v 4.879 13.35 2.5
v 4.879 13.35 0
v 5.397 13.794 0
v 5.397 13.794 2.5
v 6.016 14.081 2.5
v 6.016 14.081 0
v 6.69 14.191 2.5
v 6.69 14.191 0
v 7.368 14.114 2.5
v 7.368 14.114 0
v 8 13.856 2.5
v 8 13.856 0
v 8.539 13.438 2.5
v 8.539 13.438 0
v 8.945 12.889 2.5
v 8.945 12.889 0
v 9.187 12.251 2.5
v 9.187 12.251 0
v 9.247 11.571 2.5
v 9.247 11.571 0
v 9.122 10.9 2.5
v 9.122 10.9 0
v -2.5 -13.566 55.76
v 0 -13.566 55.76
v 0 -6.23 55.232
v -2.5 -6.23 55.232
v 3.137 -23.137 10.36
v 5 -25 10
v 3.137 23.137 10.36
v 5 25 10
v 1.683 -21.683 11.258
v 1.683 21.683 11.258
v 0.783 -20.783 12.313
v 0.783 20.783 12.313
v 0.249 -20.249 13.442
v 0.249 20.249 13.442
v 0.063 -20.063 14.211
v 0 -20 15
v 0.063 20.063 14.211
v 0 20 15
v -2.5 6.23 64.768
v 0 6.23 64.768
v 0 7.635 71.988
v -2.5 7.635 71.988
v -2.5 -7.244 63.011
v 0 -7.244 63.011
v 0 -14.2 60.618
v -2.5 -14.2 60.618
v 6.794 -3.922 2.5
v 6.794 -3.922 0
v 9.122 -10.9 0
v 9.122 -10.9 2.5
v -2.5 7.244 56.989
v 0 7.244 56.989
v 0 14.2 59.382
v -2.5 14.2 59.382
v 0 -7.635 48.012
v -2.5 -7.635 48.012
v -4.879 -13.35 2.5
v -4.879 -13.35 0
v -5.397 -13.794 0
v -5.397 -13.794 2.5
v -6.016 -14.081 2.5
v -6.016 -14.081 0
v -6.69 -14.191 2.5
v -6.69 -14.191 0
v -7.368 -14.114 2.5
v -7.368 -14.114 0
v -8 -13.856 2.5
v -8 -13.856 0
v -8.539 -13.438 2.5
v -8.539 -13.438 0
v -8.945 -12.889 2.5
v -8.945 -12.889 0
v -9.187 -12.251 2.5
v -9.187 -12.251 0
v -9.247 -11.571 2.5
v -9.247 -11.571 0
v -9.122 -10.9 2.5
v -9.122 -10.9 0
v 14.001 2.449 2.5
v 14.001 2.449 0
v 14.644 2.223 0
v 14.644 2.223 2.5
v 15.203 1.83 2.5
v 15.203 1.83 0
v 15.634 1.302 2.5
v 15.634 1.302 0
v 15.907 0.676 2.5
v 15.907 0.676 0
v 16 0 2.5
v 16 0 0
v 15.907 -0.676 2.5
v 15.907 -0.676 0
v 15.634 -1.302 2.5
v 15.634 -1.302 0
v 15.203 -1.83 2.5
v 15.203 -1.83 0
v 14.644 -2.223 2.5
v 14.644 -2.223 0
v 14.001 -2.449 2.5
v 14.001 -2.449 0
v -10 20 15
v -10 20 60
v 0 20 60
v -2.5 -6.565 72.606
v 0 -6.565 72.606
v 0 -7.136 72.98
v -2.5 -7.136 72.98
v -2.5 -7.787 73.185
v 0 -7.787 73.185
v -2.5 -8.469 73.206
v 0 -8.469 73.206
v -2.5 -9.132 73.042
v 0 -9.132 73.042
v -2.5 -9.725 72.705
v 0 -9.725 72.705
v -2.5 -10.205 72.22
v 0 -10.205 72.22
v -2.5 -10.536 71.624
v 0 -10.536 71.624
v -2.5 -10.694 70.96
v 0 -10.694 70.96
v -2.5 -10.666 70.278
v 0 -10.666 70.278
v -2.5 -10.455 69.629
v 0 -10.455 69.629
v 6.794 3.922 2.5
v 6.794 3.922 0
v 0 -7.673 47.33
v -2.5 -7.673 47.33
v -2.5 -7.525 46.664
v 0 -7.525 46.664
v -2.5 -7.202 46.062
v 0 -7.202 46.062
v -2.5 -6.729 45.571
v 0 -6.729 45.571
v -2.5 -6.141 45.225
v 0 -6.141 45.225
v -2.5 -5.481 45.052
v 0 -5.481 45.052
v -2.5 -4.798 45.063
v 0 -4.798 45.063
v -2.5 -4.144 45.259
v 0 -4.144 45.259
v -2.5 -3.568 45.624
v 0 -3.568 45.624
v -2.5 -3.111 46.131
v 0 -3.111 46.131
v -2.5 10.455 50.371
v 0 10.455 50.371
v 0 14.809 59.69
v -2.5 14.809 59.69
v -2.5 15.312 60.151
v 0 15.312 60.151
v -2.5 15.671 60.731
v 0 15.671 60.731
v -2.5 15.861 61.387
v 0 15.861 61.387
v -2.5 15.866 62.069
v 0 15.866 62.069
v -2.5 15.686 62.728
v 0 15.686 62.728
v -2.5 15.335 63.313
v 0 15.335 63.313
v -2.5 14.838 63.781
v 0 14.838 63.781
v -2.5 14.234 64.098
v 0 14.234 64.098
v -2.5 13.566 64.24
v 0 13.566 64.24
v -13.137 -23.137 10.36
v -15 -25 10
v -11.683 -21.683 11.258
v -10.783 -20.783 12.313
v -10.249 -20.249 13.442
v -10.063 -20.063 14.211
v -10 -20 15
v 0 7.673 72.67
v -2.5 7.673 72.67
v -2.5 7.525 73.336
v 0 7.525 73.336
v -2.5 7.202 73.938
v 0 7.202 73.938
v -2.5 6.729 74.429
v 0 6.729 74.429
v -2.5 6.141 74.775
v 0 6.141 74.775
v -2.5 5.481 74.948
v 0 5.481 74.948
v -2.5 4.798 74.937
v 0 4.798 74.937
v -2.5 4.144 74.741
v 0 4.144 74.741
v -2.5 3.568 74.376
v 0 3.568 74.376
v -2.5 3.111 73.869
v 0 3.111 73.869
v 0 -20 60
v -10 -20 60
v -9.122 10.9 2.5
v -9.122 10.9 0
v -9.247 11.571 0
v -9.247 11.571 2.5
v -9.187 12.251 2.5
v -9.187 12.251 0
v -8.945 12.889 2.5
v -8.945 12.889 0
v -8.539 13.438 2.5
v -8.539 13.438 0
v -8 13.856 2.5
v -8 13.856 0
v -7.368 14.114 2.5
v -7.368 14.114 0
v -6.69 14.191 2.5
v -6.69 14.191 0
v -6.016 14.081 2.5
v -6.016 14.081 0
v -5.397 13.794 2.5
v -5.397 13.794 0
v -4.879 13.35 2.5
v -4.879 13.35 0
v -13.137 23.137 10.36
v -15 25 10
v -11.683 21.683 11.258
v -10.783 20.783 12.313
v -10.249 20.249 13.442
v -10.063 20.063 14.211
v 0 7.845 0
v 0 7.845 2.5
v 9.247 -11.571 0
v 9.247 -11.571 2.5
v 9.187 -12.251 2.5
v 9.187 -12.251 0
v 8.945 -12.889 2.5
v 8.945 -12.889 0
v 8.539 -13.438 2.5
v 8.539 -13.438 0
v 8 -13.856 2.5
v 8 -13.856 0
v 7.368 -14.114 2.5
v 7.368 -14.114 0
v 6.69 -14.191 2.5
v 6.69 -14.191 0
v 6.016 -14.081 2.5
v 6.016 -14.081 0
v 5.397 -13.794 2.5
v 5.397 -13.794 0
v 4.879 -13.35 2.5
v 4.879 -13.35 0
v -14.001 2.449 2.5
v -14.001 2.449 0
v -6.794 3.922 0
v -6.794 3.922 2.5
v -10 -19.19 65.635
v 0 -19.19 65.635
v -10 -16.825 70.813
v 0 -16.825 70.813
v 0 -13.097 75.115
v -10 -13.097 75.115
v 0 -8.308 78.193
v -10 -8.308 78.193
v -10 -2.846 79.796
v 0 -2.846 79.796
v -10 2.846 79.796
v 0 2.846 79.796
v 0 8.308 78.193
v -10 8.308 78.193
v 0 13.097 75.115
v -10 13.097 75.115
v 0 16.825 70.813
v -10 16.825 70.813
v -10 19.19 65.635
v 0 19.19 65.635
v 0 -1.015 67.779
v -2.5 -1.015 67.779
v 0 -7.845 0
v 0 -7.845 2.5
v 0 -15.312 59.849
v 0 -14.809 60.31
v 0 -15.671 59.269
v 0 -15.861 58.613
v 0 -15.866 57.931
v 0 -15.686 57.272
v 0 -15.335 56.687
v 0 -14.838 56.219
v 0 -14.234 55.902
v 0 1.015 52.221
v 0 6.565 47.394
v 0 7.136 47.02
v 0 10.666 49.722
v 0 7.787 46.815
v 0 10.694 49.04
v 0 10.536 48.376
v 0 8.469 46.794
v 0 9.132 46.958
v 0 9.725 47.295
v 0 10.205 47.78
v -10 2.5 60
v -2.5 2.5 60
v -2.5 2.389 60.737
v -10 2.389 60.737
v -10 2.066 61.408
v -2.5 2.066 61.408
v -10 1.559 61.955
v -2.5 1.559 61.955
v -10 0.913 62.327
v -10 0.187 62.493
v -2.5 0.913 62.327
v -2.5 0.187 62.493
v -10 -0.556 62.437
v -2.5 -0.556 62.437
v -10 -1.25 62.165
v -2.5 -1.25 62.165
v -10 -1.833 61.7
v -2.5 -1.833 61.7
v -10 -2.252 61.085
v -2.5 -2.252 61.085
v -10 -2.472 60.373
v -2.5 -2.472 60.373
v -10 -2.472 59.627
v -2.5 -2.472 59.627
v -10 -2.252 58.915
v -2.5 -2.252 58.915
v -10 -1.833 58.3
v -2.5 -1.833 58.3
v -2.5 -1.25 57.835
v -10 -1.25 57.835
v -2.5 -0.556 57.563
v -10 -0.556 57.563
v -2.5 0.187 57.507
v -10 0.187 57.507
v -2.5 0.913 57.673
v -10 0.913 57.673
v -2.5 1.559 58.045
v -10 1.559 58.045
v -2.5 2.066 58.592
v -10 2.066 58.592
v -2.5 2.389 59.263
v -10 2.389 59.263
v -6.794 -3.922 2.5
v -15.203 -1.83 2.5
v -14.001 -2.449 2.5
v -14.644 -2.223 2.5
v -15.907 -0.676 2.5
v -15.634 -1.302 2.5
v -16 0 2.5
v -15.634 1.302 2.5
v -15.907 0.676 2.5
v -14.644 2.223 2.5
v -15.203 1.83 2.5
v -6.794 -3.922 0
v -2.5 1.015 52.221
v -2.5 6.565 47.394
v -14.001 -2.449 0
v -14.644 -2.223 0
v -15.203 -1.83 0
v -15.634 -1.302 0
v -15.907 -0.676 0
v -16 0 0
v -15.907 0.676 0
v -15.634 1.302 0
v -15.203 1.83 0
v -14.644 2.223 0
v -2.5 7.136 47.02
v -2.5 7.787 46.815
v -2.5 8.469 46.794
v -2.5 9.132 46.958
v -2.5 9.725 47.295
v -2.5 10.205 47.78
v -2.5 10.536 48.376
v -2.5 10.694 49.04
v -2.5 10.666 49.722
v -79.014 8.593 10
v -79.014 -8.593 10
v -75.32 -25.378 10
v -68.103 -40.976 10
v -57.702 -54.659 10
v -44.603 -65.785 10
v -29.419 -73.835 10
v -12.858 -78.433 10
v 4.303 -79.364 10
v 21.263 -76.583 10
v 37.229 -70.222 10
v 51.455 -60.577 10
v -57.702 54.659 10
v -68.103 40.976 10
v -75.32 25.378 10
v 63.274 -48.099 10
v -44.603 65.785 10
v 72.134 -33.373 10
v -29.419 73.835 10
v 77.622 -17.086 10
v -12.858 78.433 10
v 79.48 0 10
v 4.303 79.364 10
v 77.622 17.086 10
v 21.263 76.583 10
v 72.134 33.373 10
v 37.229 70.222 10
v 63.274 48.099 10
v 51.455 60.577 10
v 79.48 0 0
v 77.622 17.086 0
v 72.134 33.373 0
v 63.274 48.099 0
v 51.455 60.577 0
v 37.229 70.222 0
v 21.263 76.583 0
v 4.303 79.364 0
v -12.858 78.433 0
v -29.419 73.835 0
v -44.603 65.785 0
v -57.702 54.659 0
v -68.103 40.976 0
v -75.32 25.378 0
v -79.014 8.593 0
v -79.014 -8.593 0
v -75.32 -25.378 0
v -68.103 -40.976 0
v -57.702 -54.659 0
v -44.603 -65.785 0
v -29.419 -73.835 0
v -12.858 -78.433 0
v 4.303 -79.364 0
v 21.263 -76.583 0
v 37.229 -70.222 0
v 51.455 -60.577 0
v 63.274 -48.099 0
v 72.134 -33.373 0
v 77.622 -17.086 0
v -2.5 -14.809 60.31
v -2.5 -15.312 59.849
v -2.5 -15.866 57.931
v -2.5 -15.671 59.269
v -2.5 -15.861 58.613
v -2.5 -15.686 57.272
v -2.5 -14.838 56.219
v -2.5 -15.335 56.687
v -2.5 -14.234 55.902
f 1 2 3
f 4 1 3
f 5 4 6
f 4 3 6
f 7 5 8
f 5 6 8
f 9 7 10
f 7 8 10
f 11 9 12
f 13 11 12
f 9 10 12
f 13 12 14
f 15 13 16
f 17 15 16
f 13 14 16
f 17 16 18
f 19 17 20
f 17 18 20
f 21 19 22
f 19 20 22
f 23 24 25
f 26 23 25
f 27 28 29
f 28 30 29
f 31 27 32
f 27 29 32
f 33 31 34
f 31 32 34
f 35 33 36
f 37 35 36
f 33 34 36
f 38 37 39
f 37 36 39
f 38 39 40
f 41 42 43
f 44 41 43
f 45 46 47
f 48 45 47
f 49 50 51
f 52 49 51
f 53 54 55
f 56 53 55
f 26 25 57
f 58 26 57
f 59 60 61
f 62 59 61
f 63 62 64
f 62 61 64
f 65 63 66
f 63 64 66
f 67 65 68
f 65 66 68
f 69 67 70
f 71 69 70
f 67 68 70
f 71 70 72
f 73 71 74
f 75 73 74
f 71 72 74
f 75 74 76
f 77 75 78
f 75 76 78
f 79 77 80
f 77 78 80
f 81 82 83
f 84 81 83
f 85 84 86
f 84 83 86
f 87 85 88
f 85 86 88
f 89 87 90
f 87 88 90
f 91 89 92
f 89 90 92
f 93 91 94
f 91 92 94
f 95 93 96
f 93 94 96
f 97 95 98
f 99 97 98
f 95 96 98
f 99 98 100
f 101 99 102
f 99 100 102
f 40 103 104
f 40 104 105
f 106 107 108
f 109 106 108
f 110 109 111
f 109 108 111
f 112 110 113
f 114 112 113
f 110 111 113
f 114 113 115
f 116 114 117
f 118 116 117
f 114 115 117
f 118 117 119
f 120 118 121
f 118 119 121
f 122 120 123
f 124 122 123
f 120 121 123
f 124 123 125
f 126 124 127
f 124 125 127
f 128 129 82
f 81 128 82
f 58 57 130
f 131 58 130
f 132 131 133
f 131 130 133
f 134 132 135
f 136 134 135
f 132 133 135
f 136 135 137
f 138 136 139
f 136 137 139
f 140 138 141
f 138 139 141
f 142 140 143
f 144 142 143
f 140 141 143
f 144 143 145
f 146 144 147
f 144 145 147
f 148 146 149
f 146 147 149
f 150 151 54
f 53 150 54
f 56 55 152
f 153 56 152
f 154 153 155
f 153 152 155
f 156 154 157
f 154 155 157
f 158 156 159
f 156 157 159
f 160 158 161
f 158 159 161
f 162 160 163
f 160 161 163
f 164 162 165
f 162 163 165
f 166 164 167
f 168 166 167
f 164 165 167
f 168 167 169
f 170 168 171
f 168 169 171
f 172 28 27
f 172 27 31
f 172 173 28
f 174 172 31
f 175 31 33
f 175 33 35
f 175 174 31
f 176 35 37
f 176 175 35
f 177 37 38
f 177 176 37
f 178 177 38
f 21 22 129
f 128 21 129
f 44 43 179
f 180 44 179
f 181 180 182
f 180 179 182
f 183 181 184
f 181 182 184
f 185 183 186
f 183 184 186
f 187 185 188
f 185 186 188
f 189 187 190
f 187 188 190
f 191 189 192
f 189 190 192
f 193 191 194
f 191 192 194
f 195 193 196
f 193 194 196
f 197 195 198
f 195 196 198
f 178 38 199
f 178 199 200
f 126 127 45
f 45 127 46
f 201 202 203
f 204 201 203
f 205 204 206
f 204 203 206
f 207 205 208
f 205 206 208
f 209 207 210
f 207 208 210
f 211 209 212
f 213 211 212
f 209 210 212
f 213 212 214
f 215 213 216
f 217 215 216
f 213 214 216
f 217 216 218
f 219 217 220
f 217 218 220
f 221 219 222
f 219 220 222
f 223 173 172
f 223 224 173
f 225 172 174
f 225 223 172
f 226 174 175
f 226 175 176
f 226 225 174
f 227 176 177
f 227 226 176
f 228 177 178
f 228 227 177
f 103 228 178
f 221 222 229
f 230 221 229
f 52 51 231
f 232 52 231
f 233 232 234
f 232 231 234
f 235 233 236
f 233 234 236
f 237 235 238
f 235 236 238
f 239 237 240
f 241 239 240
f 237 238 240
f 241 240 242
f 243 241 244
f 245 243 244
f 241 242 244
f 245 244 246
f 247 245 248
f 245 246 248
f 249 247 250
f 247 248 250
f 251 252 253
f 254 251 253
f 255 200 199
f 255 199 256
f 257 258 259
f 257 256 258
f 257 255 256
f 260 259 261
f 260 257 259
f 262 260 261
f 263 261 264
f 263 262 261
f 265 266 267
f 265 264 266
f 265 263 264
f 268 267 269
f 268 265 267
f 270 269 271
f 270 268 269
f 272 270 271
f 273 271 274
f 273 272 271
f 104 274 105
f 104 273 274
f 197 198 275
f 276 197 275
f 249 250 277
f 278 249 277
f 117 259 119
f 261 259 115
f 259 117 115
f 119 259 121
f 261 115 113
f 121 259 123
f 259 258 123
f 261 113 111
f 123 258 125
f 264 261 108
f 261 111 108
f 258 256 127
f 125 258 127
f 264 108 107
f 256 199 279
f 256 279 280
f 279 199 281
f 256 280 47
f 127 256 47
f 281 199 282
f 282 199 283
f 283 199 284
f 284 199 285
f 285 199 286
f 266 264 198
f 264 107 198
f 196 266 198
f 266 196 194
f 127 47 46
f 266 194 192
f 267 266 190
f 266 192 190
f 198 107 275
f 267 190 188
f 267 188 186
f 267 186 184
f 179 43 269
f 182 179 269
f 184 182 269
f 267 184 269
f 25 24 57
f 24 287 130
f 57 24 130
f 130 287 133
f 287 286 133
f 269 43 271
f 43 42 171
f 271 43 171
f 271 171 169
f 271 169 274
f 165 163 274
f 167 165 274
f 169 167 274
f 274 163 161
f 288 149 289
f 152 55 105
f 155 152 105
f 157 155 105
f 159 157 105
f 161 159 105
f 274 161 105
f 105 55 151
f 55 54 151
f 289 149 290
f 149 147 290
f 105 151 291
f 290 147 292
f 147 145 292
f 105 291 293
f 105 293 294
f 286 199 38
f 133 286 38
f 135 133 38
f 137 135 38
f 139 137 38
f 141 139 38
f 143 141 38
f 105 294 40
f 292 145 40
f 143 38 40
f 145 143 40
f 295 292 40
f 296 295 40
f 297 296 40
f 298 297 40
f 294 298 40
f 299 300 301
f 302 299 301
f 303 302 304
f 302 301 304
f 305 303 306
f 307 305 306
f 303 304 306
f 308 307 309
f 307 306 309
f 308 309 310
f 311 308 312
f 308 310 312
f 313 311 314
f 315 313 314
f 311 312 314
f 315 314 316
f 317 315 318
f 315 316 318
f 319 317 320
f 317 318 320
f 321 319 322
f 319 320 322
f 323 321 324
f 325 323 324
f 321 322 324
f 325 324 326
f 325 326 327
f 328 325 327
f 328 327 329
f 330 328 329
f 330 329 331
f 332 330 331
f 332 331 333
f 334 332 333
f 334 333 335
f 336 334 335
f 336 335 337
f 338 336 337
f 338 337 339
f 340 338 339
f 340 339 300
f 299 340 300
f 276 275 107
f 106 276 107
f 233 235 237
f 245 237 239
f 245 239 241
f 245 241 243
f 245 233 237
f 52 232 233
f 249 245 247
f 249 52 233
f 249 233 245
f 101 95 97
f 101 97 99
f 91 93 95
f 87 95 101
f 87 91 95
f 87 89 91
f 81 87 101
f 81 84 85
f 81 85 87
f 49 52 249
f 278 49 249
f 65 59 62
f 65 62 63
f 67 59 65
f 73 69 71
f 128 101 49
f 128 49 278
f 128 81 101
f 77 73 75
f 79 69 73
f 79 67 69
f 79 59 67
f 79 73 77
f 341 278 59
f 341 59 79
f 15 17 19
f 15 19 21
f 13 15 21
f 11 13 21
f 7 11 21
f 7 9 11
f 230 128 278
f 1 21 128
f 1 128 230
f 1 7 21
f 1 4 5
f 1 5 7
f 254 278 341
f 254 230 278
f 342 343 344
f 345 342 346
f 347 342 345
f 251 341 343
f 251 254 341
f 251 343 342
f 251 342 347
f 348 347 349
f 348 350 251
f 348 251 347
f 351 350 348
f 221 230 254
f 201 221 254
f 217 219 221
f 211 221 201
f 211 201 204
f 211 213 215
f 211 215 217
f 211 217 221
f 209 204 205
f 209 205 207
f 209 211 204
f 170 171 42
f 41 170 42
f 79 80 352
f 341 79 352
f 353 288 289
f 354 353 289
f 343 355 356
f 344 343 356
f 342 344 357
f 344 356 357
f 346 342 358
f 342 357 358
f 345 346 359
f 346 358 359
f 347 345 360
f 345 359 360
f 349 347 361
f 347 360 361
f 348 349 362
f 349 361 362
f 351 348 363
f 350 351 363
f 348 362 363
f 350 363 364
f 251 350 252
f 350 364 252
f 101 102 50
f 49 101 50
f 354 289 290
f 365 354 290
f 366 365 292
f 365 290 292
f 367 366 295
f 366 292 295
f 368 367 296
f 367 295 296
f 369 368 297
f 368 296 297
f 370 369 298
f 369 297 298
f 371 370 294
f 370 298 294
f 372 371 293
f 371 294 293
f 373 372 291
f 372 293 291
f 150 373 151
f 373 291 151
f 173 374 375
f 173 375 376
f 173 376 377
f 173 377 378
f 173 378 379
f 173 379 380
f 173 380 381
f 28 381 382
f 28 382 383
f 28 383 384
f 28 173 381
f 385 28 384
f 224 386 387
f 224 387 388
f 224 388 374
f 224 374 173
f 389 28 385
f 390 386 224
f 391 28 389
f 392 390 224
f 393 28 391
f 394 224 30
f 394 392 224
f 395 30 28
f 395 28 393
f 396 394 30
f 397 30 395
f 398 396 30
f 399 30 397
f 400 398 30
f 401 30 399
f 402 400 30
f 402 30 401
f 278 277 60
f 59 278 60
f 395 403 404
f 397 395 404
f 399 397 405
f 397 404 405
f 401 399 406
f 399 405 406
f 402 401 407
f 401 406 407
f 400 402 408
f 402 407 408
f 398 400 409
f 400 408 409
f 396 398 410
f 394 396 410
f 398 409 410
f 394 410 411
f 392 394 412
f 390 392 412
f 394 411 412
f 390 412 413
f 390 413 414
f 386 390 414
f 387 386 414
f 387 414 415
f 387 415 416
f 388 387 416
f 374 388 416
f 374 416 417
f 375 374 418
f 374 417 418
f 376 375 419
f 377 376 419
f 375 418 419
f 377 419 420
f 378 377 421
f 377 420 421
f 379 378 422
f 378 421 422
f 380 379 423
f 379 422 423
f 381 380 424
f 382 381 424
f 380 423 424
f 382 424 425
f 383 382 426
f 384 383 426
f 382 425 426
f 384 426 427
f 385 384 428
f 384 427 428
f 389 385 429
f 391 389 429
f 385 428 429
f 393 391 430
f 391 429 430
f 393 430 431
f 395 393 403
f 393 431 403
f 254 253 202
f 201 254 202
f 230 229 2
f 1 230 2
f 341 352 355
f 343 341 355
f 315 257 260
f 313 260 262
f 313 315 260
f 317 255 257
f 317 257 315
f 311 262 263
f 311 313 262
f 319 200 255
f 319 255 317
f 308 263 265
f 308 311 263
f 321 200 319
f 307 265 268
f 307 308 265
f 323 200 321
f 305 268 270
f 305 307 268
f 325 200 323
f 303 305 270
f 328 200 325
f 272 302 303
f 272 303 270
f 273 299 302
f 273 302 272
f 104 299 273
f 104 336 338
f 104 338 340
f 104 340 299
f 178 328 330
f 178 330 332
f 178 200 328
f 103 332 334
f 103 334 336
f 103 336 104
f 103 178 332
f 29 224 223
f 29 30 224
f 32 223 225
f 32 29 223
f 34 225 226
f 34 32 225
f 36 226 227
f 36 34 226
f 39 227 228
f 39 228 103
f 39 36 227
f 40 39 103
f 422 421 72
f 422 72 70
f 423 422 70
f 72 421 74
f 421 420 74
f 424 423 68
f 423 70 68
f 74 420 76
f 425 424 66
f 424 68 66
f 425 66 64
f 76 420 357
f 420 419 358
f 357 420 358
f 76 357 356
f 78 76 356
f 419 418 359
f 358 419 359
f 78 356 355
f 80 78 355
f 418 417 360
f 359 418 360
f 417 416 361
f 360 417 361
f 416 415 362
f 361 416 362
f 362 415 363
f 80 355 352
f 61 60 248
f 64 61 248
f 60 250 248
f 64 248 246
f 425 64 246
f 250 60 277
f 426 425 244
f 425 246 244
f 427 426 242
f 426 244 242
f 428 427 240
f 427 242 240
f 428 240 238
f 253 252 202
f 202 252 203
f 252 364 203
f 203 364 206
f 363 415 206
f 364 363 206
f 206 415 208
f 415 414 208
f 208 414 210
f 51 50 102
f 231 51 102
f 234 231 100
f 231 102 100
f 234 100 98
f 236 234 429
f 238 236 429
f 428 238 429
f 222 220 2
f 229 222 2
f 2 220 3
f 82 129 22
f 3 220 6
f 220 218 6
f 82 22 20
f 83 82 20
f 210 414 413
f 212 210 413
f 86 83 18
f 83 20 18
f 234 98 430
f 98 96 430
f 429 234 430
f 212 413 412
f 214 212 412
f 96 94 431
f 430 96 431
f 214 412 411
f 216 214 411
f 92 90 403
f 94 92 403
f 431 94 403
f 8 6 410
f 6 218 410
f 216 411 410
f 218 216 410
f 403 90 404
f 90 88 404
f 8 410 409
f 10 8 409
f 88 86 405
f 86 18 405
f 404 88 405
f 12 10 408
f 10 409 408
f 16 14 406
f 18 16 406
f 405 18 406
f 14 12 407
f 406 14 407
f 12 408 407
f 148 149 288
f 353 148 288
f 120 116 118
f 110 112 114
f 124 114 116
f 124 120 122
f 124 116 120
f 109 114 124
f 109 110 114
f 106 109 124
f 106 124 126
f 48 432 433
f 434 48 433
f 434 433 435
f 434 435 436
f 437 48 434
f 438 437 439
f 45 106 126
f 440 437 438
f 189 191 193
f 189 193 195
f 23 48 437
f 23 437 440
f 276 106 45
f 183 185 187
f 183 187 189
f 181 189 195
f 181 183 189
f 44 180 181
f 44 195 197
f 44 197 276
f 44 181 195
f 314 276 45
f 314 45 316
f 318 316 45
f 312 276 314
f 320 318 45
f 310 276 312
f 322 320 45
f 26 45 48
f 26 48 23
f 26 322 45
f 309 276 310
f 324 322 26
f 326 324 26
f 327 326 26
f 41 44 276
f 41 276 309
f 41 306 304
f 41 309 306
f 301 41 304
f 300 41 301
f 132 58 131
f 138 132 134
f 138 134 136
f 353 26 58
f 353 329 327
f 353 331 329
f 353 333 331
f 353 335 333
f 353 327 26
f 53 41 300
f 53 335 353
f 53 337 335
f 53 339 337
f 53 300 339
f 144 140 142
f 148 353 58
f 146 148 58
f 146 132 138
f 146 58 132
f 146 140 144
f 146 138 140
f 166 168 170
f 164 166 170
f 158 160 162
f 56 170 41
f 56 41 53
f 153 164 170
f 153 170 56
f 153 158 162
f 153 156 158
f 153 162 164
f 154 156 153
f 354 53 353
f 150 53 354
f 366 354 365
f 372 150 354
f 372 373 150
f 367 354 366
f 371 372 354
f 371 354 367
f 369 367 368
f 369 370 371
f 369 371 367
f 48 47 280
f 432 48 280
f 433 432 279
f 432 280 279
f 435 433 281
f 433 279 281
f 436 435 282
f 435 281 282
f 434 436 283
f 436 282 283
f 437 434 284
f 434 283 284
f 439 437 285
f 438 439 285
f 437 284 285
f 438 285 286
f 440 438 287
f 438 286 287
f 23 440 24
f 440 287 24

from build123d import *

# Parameters (mm, degrees)
SKETCH1_R           = 79.480373192
BOSS_EXTRUDE1_DEPTH = 10
BOSS_EXTRUDE2_DEPTH = 70
FILLET3_R           = 5
SKETCH7_R           = 2.5
CUT_EXTRUDE4_DEPTH  = 138.964703622
CUT_EXTRUDE6_DEPTH  = 2.5
FILLET5_RADIUS      = 20
FILLET5_LENGTH      = 10
CUT_EXTRUDE7_DEPTH  = 2.5


with BuildPart() as part:
    # Sketch1 → Boss-Extrude1 (new body)
    with BuildSketch(Plane.XY):
        Circle(SKETCH1_R)
    extrude(amount=BOSS_EXTRUDE1_DEPTH)

    # Sketch2 → Boss-Extrude2 (add)
    with BuildSketch(Plane.XY.offset(10)):
        Polygon((0, 0), (0, -20), (-10, -20), (-10, 20), (0, 20), align=None)
    extrude(amount=BOSS_EXTRUDE2_DEPTH)

    # Fillet3
    fillet3_edges = [part.edges().sort_by_distance(p)[0] for p in [
        (-5, 20, 10),
        (-10, 0, 10),
        (-5, -20, 10),
        (0, 0, 10),
    ]]
    fillet(fillet3_edges, radius=FILLET3_R)

    # Sketch7 → Cut-Extrude4 (cut, through all)
    with BuildSketch(Plane(origin=(0, 0, 0), x_dir=(0, 0, -1), z_dir=(1, 0, 0))):
        with Locations(Location((-60, 0, 0), (0, 0, 90))):
            Circle(SKETCH7_R)
    extrude(amount=-CUT_EXTRUDE4_DEPTH, mode=Mode.SUBTRACT)

    # Sketch9 → Cut-Extrude6 (cut)
    with BuildSketch(Plane(origin=(0, 0, 0), x_dir=(0, 0, -1), z_dir=(1, 0, 0))):
        with BuildLine():
            Line((-64.239646316, 13.566264372), (-64.768269058, 6.229526416))
            Line((-64.768269058, 6.229526416), (-71.988493293, 7.63506113))
            ThreePointArc((-71.988493293, 7.63506113), (-74.774746239, 6.140592282), (-73.868552739, 3.111490773))
            Line((-73.868552739, 3.111490773), (-67.779062658, -1.014678928))
            Line((-67.779062658, -1.014678928), (-72.606403544, -6.56480918))
            ThreePointArc((-72.606403544, -6.56480918), (-72.70528203, -9.725009436), (-69.628906423, -10.454773599))
            Line((-69.628906423, -10.454773599), (-63.010793601, -7.244205344))
            Line((-63.010793601, -7.244205344), (-60.617910251, -14.19987031))
            ThreePointArc((-60.617910251, -14.19987031), (-57.930535791, -15.865601718), (-55.760353684, -13.566264372))
            Line((-55.760353684, -13.566264372), (-55.231730942, -6.229526416))
            Line((-55.231730942, -6.229526416), (-48.011506707, -7.63506113))
            ThreePointArc((-48.011506707, -7.63506113), (-45.225253761, -6.140592282), (-46.131447261, -3.111490773))
            Line((-46.131447261, -3.111490773), (-52.220937342, 1.014678928))
            Line((-52.220937342, 1.014678928), (-47.393596456, 6.56480918))
            ThreePointArc((-47.393596456, 6.56480918), (-47.29471797, 9.725009436), (-50.371093577, 10.454773599))
            Line((-50.371093577, 10.454773599), (-56.989206399, 7.244205344))
            Line((-56.989206399, 7.244205344), (-59.382089749, 14.19987031))
            ThreePointArc((-59.382089749, 14.19987031), (-62.069464209, 15.865601718), (-64.239646316, 13.566264372))
        make_face()
    extrude(amount=-CUT_EXTRUDE6_DEPTH, mode=Mode.SUBTRACT)

    # Fillet5: full round fillet: the end face becomes a half cylinder, R = half its width
    fillet5_face = Plane((-5, 0, 80), x_dir=(-1, 0, 0), z_dir=(0, 0, 1))  # on the end face: x along it, z out of the body
    fillet5_slab = fillet5_face.offset(-FILLET5_RADIUS / 2) * Box(FILLET5_LENGTH, 2 * FILLET5_RADIUS, FILLET5_RADIUS, mode=Mode.PRIVATE)  # the body's end, R deep
    fillet5_round = Plane((-5, 0, 60), x_dir=(0, 0, 1), z_dir=(-1, 0, 0)) * Cylinder(FILLET5_RADIUS, FILLET5_LENGTH, mode=Mode.PRIVATE)  # its axis R under the face
    add(fillet5_slab - fillet5_round, mode=Mode.SUBTRACT)

    # Sketch4 → Cut-Extrude7 (cut)
    with BuildSketch(Plane(origin=(0, 0, 0), x_dir=(-1, 0, 0), z_dir=(0, 0, -1))):
        with BuildLine():
            Line((-9.121537298, 10.900260879), (-6.793934197, 3.922479738))
            Line((-6.793934197, 3.922479738), (-14.000671478, 2.449352582))
            ThreePointArc((-14.000671478, 2.449352582), (-16, 0), (-14.000671478, -2.449352582))
            Line((-14.000671478, -2.449352582), (-6.793934197, -3.922479738))
            Line((-6.793934197, -3.922479738), (-9.121537298, -10.900260879))
            ThreePointArc((-9.121537298, -10.900260879), (-8, -13.856406461), (-4.87913418, -13.349613461))
            Line((-4.87913418, -13.349613461), (0, -7.844959475))
            Line((0, -7.844959475), (4.87913418, -13.349613461))
            ThreePointArc((4.87913418, -13.349613461), (8, -13.856406461), (9.121537298, -10.900260879))
            Line((9.121537298, -10.900260879), (6.793934197, -3.922479738))
            Line((6.793934197, -3.922479738), (14.000671478, -2.449352582))
            ThreePointArc((14.000671478, -2.449352582), (16, 0), (14.000671478, 2.449352582))
            Line((14.000671478, 2.449352582), (6.793934197, 3.922479738))
            Line((6.793934197, 3.922479738), (9.121537298, 10.900260879))
            ThreePointArc((9.121537298, 10.900260879), (8, 13.856406461), (4.87913418, 13.349613461))
            Line((4.87913418, 13.349613461), (0, 7.844959475))
            Line((0, 7.844959475), (-4.87913418, 13.349613461))
            ThreePointArc((-4.87913418, 13.349613461), (-8, 13.856406461), (-9.121537298, 10.900260879))
        make_face()
    extrude(amount=-CUT_EXTRUDE7_DEPTH, mode=Mode.SUBTRACT)


solid = part.part
